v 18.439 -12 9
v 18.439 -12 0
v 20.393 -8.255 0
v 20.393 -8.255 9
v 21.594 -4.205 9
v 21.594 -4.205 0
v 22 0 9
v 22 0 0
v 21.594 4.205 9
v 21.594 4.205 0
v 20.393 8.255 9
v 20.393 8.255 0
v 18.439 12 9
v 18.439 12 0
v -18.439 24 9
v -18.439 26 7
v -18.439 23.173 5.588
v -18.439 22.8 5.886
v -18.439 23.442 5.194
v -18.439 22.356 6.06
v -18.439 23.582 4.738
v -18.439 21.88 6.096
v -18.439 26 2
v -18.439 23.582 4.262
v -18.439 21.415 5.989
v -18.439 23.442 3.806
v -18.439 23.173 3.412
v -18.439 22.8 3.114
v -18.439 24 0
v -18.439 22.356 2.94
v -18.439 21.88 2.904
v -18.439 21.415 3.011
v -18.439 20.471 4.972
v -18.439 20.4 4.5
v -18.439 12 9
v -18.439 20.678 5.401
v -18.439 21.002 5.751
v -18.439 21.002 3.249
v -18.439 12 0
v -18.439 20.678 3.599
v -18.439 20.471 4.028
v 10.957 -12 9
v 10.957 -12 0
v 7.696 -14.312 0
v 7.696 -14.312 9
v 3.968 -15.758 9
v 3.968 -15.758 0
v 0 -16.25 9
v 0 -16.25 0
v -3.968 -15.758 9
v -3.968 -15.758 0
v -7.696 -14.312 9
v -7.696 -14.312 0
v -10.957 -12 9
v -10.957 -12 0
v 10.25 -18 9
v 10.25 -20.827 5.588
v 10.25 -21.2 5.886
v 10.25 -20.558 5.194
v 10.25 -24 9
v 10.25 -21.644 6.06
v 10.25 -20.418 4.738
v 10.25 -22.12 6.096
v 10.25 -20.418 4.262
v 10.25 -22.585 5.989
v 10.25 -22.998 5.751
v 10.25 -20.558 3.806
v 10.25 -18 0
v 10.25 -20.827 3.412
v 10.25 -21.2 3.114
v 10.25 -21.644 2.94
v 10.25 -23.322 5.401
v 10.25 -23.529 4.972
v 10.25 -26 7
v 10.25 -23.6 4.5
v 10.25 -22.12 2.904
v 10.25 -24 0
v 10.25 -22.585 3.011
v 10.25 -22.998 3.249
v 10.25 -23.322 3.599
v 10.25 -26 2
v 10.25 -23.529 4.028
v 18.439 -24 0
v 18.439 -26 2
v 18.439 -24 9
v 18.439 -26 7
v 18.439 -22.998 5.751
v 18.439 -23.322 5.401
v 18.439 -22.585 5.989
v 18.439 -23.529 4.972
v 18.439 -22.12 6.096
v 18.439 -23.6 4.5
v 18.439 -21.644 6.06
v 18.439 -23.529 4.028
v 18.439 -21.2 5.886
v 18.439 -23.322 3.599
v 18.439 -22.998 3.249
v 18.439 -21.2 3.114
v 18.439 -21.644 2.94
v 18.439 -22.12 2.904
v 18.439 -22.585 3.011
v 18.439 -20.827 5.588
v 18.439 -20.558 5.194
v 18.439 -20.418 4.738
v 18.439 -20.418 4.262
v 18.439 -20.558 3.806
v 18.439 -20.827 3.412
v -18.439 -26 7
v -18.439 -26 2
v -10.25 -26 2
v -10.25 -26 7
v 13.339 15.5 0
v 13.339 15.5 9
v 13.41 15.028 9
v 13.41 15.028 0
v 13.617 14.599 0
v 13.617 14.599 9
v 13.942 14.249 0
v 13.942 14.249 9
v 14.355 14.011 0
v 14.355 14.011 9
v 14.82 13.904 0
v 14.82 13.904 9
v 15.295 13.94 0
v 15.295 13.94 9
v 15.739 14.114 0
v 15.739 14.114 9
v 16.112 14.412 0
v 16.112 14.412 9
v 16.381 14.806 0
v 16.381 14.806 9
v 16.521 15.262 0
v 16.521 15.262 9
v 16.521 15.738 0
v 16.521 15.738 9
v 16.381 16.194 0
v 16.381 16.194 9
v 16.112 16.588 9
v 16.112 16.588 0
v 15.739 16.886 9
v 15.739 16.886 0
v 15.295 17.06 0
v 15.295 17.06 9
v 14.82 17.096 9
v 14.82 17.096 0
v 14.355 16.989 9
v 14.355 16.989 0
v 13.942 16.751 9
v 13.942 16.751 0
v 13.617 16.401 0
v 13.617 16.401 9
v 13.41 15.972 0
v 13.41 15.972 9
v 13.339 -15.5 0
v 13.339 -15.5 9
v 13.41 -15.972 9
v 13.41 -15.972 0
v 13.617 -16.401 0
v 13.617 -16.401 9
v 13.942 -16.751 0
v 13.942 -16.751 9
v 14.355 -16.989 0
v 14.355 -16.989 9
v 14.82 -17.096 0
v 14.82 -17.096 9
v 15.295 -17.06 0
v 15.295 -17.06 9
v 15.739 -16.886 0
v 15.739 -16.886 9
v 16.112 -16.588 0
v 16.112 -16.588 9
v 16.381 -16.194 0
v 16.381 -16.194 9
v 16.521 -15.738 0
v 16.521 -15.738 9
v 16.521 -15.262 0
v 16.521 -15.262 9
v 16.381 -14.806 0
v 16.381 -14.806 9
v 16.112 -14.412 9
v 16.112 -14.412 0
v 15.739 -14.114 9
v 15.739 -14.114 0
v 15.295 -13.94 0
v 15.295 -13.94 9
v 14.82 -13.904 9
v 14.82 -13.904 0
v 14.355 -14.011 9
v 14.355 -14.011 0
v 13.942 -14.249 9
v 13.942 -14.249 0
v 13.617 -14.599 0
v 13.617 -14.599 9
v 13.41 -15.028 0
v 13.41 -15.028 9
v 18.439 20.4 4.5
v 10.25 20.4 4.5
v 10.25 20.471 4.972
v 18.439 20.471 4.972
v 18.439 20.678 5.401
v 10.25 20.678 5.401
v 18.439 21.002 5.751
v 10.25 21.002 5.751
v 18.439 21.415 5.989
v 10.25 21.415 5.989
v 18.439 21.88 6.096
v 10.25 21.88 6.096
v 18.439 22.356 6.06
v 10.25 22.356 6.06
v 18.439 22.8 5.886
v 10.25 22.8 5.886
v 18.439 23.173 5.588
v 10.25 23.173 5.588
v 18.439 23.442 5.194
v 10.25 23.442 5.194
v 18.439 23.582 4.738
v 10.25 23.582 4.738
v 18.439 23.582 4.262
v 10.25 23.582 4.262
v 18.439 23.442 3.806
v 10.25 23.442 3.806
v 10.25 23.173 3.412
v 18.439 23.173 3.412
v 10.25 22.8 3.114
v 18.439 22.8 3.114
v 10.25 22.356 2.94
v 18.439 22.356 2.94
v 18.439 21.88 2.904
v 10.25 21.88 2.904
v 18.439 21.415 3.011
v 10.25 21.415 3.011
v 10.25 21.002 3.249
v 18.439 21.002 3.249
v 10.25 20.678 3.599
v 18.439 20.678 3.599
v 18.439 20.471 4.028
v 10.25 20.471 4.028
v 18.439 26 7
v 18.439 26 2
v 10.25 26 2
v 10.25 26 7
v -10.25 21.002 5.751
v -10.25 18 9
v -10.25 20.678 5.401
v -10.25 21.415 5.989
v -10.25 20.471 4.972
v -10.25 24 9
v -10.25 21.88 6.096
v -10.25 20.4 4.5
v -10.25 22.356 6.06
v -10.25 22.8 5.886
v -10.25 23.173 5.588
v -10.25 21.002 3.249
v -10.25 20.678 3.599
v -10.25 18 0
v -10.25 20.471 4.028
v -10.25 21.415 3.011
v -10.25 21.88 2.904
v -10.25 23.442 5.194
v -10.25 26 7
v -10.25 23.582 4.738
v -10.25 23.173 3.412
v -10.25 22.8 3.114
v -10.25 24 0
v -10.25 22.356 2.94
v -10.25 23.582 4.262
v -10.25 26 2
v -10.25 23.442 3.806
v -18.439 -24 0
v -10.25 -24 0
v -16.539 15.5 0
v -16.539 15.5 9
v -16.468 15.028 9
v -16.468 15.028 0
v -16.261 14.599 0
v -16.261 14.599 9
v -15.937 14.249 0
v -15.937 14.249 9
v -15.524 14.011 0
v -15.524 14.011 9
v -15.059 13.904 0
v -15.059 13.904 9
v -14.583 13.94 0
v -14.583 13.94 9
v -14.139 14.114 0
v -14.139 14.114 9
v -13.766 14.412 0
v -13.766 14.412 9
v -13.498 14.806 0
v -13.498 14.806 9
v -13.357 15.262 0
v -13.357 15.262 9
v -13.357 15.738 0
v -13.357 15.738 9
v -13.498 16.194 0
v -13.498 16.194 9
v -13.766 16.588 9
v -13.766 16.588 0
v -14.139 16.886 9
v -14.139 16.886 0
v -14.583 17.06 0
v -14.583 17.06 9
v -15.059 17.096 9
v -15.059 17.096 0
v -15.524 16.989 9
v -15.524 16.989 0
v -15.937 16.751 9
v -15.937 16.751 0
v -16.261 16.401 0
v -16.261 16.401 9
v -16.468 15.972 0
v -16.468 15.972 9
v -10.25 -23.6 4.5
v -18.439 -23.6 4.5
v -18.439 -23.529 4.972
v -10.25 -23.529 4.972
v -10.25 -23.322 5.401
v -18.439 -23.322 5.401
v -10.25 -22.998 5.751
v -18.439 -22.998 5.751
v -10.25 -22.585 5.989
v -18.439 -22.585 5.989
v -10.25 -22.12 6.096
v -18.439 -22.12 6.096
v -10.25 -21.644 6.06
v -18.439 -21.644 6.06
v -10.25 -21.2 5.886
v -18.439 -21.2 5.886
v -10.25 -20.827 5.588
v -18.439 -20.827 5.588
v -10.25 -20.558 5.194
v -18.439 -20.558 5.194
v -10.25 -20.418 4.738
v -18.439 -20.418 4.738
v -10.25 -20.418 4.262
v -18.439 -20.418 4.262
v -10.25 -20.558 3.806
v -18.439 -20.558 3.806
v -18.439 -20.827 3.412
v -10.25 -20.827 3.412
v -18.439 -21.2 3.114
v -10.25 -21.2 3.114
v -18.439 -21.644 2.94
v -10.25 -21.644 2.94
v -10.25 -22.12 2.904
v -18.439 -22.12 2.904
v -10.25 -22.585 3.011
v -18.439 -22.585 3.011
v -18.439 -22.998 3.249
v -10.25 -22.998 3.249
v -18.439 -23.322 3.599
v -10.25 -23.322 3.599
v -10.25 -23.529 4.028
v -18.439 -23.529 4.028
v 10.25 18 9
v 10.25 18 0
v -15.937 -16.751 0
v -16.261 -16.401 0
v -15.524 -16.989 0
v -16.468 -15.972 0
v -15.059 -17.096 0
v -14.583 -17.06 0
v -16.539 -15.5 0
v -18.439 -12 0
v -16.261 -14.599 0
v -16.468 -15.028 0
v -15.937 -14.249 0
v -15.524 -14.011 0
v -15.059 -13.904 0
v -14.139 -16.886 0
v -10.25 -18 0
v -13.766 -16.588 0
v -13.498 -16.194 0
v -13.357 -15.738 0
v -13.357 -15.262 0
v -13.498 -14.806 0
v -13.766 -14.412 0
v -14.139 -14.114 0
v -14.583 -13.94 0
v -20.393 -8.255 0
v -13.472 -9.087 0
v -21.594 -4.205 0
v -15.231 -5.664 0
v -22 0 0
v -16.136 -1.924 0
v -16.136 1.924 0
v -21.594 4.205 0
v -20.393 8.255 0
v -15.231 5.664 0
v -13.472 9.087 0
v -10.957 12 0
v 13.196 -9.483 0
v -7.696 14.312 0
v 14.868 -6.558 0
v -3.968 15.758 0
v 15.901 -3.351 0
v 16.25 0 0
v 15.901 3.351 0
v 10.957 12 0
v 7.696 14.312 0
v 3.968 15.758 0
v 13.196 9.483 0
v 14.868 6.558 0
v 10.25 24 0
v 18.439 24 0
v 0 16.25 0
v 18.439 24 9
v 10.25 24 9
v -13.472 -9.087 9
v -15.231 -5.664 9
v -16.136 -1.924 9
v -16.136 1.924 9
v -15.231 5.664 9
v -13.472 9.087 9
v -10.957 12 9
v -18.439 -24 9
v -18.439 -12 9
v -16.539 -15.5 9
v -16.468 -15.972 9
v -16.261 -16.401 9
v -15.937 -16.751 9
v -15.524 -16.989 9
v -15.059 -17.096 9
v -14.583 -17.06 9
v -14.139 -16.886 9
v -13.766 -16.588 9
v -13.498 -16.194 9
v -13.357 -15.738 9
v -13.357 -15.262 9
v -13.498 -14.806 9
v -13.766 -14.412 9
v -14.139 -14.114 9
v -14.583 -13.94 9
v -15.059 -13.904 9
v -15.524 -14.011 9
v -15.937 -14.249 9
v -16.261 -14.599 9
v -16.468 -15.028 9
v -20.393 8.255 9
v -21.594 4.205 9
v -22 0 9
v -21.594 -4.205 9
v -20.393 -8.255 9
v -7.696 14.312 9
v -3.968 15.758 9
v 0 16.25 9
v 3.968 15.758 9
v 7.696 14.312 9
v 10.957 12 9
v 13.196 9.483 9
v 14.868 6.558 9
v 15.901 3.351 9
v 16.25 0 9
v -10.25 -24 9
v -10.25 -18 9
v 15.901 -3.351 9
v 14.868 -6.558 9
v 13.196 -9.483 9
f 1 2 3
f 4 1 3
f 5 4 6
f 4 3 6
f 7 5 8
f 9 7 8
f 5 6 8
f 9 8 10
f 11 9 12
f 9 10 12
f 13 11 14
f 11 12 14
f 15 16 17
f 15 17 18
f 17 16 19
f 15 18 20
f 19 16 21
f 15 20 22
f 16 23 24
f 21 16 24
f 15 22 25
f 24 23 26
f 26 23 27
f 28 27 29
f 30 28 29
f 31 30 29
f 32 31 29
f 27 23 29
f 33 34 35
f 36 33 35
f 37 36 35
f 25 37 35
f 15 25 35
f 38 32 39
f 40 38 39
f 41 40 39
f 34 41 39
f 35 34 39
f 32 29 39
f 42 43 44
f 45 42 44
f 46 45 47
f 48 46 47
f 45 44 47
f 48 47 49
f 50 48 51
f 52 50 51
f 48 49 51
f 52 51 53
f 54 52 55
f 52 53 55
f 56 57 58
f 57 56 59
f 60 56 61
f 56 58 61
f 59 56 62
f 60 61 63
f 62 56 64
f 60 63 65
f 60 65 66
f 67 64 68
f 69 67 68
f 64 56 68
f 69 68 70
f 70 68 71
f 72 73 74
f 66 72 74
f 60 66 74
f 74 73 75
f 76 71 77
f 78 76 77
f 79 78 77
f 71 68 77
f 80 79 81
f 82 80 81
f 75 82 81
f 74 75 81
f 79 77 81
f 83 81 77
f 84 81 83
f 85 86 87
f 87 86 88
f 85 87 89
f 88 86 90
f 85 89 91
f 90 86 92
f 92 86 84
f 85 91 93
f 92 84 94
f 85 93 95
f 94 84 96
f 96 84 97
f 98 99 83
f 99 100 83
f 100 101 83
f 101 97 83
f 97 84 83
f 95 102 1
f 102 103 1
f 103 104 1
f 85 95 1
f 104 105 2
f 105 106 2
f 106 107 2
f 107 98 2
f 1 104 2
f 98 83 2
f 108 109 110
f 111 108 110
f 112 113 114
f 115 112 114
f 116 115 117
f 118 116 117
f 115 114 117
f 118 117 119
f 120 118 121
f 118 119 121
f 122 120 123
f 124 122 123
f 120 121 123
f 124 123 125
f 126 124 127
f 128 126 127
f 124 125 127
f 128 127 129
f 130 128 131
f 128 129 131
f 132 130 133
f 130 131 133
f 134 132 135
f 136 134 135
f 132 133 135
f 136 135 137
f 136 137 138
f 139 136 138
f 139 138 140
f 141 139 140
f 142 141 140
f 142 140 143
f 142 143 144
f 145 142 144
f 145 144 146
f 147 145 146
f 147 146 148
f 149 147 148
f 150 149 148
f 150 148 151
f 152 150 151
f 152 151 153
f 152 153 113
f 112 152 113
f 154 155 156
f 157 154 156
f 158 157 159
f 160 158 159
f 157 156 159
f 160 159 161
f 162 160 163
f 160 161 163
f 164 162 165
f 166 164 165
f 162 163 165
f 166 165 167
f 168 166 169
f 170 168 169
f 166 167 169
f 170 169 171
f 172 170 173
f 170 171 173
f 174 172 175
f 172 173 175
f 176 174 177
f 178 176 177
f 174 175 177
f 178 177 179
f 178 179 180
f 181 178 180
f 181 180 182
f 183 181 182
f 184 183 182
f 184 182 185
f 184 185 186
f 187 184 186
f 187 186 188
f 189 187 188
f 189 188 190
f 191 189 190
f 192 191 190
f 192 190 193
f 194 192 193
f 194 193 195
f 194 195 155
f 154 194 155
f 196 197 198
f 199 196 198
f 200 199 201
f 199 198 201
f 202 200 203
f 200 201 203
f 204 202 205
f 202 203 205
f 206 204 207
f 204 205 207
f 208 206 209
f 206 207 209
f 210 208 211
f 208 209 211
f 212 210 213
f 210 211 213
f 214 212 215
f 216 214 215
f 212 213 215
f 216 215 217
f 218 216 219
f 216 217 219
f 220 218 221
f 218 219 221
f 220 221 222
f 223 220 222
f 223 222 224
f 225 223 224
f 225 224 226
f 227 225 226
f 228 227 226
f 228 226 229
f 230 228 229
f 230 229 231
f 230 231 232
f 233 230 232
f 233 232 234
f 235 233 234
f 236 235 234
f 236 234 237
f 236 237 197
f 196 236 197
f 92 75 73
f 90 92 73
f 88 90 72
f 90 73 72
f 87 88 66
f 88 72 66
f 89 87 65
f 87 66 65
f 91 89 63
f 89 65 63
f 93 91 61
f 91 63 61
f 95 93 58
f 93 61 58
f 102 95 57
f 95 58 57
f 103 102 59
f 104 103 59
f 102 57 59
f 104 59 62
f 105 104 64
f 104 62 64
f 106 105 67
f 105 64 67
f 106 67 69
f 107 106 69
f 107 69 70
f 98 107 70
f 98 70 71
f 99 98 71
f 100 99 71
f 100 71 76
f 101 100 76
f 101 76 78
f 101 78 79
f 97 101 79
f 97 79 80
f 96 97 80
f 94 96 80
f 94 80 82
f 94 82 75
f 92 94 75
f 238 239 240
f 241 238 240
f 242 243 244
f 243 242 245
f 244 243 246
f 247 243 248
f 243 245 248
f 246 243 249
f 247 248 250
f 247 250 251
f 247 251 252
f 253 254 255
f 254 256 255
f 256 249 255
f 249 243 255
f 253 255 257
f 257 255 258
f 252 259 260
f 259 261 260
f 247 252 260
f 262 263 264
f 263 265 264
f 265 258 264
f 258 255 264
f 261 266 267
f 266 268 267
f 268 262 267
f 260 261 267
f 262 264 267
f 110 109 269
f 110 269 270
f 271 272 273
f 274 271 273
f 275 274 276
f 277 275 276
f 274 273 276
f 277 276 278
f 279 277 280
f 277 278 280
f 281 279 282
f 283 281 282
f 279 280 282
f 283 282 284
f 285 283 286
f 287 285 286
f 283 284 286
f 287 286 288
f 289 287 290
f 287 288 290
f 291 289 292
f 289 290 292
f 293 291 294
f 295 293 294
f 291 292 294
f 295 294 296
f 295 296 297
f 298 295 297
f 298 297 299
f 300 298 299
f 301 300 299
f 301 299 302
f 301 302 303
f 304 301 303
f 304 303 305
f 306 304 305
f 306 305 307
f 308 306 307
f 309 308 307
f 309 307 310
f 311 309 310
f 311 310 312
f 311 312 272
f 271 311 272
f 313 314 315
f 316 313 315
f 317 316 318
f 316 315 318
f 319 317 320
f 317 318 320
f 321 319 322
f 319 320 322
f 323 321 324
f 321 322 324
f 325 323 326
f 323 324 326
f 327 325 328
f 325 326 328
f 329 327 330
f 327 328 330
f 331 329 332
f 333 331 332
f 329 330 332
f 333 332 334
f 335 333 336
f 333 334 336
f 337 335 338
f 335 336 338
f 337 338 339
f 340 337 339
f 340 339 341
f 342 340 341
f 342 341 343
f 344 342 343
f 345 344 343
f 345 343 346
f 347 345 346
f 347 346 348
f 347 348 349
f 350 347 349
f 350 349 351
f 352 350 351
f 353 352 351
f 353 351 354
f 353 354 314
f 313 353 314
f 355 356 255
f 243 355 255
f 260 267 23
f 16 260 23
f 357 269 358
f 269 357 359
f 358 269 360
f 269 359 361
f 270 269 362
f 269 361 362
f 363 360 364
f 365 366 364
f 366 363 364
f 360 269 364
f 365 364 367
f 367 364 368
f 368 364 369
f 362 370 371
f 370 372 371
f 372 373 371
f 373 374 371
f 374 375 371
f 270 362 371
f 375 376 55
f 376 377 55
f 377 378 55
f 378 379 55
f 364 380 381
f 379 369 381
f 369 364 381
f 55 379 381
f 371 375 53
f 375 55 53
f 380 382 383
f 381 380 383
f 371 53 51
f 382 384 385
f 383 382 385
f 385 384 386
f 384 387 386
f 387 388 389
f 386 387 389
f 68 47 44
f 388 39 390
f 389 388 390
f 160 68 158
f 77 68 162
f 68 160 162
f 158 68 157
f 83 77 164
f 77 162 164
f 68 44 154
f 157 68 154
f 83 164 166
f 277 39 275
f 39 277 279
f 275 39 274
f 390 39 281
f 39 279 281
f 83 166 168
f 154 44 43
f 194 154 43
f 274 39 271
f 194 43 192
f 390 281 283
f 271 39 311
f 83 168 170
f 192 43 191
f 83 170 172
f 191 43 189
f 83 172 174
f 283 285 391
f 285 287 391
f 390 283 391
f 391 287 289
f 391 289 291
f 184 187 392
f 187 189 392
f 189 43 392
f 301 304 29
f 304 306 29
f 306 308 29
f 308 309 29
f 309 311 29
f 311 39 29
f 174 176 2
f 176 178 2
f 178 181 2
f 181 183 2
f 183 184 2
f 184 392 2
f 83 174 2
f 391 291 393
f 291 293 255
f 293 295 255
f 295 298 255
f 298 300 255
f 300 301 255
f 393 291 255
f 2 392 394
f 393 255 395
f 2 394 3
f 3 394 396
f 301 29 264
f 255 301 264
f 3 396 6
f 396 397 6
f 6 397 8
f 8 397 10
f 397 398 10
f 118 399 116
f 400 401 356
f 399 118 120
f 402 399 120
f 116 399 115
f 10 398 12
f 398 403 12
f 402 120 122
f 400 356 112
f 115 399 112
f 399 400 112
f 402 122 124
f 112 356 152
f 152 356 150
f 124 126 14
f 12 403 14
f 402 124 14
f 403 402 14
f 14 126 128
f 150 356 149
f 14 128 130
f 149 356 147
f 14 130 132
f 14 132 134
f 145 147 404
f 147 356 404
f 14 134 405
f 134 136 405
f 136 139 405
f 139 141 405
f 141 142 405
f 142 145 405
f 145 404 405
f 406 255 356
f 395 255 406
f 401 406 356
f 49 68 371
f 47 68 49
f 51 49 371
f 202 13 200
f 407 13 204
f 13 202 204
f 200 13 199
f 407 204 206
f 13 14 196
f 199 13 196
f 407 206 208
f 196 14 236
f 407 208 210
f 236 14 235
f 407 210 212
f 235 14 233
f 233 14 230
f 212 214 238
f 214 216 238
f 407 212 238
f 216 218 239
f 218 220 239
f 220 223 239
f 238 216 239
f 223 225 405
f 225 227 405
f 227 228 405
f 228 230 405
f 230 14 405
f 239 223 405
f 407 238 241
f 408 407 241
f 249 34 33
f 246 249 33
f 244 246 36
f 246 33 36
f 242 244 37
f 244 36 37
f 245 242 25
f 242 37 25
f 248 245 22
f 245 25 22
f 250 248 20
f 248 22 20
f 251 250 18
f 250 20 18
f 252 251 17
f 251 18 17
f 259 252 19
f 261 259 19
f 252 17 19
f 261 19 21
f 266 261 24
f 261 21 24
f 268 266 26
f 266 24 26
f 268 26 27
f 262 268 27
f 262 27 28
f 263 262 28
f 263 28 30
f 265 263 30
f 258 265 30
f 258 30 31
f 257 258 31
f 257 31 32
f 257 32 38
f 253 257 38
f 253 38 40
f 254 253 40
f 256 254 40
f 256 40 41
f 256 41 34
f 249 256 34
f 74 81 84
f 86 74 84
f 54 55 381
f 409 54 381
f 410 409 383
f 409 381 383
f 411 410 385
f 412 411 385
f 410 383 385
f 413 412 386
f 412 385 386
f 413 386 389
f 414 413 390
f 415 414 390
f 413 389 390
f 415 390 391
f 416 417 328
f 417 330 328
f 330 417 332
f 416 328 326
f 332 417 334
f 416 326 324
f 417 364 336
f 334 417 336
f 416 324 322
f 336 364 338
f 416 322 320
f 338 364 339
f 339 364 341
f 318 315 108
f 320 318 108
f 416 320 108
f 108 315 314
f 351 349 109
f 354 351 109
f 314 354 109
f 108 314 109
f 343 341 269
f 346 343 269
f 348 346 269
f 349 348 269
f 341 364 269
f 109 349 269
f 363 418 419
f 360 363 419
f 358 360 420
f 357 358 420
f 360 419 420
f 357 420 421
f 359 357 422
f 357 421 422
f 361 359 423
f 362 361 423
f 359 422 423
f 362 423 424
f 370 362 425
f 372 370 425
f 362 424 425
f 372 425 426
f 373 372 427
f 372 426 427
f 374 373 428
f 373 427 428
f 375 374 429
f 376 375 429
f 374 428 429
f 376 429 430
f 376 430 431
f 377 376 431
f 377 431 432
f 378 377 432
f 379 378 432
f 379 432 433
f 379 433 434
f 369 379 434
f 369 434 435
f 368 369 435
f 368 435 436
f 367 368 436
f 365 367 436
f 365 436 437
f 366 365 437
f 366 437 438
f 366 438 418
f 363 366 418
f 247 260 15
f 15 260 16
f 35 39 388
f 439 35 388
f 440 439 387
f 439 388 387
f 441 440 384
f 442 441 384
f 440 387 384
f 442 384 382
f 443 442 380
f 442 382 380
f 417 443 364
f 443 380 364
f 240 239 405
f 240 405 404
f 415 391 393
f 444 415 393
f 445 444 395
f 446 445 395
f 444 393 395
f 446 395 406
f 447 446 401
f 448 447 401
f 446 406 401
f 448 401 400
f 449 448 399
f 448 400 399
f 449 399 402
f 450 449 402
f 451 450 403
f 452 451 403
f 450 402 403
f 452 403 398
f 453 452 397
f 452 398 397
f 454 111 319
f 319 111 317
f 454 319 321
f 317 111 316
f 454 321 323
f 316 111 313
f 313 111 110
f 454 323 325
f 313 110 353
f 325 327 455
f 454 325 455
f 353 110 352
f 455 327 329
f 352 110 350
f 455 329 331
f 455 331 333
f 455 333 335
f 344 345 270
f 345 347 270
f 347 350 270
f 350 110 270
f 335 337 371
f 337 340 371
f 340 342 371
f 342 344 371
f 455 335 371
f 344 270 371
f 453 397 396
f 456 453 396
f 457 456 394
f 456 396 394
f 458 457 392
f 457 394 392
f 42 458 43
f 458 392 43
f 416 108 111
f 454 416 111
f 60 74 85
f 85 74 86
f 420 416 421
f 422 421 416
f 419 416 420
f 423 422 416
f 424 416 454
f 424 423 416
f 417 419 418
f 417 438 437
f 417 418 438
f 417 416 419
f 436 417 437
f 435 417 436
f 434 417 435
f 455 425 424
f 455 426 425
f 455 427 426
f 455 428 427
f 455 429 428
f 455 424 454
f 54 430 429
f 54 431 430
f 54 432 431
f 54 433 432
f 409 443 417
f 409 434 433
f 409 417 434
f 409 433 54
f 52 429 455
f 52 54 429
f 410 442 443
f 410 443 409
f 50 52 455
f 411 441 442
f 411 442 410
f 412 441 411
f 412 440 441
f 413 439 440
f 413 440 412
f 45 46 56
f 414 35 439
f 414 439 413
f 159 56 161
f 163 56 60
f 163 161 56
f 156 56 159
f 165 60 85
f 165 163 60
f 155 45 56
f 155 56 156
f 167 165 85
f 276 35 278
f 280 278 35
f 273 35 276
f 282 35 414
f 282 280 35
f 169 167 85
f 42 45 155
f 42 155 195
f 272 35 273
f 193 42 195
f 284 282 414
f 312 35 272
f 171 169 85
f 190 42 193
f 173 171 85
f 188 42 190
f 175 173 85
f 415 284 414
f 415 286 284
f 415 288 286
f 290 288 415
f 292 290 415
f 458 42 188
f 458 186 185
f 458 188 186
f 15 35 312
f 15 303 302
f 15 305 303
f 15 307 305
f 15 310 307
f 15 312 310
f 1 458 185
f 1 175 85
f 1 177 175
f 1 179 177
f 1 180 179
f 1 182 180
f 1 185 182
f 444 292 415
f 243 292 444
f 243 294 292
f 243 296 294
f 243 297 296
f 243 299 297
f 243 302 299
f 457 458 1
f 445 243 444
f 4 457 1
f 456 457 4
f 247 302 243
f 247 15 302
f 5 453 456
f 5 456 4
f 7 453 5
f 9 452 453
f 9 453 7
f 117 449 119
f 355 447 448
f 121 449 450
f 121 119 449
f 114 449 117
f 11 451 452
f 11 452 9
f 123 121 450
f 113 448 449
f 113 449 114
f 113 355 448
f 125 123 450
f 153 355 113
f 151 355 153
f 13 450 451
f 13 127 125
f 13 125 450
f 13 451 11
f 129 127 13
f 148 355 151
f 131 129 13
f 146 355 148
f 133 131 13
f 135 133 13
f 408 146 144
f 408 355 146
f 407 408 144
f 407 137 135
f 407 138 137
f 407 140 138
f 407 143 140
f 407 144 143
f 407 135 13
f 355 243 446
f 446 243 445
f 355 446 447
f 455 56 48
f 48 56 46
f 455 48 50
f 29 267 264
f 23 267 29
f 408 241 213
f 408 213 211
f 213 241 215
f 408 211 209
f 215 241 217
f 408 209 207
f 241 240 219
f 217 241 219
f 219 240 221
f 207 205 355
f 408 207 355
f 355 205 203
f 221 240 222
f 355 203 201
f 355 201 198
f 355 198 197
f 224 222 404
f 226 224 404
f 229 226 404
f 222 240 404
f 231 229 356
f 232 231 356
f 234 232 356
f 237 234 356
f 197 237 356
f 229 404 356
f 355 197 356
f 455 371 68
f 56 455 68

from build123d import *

# Parameters (mm, degrees)
F1_DEPTH = 9
F2_D     = 3.2
F2_DEPTH = 9
F4_D     = 3.2
F4_DEPTH = 40
F5_SIZE  = 2


with BuildPart() as f1:
    # F0 (on Top) → F1 (new body)
    with BuildSketch(Plane.XY):
        with BuildLine():
            Line((18.439089, -12), (10.957304, -12))
            ThreePointArc((10.957304, -12), (0, -16.25), (-10.957304, -12))
            Line((-10.957304, -12), (-18.439089, -12))
            Line((-18.439089, -12), (-18.439089, -26))
            Line((-18.439089, -26), (-10.25, -26))
            Line((-10.25, -26), (-10.25, -18))
            Line((-10.25, -18), (10.25, -18))
            Line((10.25, -18), (10.25, -26))
            Line((10.25, -26), (18.439089, -26))
            Line((18.439089, -26), (18.439089, -12))
        make_face()
        with BuildLine():
            ThreePointArc((-10.957304, -12), (-16.25, 0), (-10.957304, 12))
            Line((-10.957304, 12), (-18.439089, 12))
            ThreePointArc((-18.439089, 12), (-22, 0), (-18.439089, -12))
            Line((-18.439089, -12), (-10.957304, -12))
        make_face()
        with BuildLine():
            ThreePointArc((-10.957304, 12), (0, 16.25), (10.957304, 12))
            Line((10.957304, 12), (18.439089, 12))
            Line((18.439089, 12), (18.439089, 26))
            Line((18.439089, 26), (10.25, 26))
            Line((10.25, 26), (10.25, 18))
            Line((10.25, 18), (-10.25, 18))
            Line((-10.25, 18), (-10.25, 26))
            Line((-10.25, 26), (-18.439089, 26))
            Line((-18.439089, 26), (-18.439089, 12))
            Line((-18.439089, 12), (-10.957304, 12))
        make_face()
        with BuildLine():
            ThreePointArc((10.957304, 12), (14.868064, 6.557679), (16.25, 0))
            ThreePointArc((16.25, 0), (14.868064, -6.557679), (10.957304, -12))
            Line((10.957304, -12), (18.439089, -12))
            ThreePointArc((18.439089, -12), (22, 0), (18.439089, 12))
            Line((18.439089, 12), (10.957304, 12))
        make_face()
    extrude(amount=F1_DEPTH)

    # F2
    with Locations(Plane(origin=(0, 0, 0), x_dir=(1, 0, 0), z_dir=(0, 0, -1))):
        with Locations((-14.939089, -15.5), (14.939089, -15.5), (14.939089, 15.5), (-14.939089, 15.5)):
            Hole(F2_D / 2, depth=F2_DEPTH)

    # F4
    with Locations(Plane.YZ.offset(18.439089)):
        with Locations((-22, 4.5), (22, 4.5)):
            Hole(F4_D / 2, depth=F4_DEPTH)

    # F5
    f5_edges = [f1.edges().sort_by_distance(p)[0] for p in [
        (14.344544, 26, 9),
        (14.344544, 26, 0),
        (-14.344544, 26, 9),
        (-14.344544, 26, 0),
        (-14.344544, -26, 9),
        (14.344544, -26, 9),
        (14.344544, -26, 0),
        (-14.344544, -26, 0),
    ]]
    chamfer(f5_edges, length=F5_SIZE)


solid = f1.part
